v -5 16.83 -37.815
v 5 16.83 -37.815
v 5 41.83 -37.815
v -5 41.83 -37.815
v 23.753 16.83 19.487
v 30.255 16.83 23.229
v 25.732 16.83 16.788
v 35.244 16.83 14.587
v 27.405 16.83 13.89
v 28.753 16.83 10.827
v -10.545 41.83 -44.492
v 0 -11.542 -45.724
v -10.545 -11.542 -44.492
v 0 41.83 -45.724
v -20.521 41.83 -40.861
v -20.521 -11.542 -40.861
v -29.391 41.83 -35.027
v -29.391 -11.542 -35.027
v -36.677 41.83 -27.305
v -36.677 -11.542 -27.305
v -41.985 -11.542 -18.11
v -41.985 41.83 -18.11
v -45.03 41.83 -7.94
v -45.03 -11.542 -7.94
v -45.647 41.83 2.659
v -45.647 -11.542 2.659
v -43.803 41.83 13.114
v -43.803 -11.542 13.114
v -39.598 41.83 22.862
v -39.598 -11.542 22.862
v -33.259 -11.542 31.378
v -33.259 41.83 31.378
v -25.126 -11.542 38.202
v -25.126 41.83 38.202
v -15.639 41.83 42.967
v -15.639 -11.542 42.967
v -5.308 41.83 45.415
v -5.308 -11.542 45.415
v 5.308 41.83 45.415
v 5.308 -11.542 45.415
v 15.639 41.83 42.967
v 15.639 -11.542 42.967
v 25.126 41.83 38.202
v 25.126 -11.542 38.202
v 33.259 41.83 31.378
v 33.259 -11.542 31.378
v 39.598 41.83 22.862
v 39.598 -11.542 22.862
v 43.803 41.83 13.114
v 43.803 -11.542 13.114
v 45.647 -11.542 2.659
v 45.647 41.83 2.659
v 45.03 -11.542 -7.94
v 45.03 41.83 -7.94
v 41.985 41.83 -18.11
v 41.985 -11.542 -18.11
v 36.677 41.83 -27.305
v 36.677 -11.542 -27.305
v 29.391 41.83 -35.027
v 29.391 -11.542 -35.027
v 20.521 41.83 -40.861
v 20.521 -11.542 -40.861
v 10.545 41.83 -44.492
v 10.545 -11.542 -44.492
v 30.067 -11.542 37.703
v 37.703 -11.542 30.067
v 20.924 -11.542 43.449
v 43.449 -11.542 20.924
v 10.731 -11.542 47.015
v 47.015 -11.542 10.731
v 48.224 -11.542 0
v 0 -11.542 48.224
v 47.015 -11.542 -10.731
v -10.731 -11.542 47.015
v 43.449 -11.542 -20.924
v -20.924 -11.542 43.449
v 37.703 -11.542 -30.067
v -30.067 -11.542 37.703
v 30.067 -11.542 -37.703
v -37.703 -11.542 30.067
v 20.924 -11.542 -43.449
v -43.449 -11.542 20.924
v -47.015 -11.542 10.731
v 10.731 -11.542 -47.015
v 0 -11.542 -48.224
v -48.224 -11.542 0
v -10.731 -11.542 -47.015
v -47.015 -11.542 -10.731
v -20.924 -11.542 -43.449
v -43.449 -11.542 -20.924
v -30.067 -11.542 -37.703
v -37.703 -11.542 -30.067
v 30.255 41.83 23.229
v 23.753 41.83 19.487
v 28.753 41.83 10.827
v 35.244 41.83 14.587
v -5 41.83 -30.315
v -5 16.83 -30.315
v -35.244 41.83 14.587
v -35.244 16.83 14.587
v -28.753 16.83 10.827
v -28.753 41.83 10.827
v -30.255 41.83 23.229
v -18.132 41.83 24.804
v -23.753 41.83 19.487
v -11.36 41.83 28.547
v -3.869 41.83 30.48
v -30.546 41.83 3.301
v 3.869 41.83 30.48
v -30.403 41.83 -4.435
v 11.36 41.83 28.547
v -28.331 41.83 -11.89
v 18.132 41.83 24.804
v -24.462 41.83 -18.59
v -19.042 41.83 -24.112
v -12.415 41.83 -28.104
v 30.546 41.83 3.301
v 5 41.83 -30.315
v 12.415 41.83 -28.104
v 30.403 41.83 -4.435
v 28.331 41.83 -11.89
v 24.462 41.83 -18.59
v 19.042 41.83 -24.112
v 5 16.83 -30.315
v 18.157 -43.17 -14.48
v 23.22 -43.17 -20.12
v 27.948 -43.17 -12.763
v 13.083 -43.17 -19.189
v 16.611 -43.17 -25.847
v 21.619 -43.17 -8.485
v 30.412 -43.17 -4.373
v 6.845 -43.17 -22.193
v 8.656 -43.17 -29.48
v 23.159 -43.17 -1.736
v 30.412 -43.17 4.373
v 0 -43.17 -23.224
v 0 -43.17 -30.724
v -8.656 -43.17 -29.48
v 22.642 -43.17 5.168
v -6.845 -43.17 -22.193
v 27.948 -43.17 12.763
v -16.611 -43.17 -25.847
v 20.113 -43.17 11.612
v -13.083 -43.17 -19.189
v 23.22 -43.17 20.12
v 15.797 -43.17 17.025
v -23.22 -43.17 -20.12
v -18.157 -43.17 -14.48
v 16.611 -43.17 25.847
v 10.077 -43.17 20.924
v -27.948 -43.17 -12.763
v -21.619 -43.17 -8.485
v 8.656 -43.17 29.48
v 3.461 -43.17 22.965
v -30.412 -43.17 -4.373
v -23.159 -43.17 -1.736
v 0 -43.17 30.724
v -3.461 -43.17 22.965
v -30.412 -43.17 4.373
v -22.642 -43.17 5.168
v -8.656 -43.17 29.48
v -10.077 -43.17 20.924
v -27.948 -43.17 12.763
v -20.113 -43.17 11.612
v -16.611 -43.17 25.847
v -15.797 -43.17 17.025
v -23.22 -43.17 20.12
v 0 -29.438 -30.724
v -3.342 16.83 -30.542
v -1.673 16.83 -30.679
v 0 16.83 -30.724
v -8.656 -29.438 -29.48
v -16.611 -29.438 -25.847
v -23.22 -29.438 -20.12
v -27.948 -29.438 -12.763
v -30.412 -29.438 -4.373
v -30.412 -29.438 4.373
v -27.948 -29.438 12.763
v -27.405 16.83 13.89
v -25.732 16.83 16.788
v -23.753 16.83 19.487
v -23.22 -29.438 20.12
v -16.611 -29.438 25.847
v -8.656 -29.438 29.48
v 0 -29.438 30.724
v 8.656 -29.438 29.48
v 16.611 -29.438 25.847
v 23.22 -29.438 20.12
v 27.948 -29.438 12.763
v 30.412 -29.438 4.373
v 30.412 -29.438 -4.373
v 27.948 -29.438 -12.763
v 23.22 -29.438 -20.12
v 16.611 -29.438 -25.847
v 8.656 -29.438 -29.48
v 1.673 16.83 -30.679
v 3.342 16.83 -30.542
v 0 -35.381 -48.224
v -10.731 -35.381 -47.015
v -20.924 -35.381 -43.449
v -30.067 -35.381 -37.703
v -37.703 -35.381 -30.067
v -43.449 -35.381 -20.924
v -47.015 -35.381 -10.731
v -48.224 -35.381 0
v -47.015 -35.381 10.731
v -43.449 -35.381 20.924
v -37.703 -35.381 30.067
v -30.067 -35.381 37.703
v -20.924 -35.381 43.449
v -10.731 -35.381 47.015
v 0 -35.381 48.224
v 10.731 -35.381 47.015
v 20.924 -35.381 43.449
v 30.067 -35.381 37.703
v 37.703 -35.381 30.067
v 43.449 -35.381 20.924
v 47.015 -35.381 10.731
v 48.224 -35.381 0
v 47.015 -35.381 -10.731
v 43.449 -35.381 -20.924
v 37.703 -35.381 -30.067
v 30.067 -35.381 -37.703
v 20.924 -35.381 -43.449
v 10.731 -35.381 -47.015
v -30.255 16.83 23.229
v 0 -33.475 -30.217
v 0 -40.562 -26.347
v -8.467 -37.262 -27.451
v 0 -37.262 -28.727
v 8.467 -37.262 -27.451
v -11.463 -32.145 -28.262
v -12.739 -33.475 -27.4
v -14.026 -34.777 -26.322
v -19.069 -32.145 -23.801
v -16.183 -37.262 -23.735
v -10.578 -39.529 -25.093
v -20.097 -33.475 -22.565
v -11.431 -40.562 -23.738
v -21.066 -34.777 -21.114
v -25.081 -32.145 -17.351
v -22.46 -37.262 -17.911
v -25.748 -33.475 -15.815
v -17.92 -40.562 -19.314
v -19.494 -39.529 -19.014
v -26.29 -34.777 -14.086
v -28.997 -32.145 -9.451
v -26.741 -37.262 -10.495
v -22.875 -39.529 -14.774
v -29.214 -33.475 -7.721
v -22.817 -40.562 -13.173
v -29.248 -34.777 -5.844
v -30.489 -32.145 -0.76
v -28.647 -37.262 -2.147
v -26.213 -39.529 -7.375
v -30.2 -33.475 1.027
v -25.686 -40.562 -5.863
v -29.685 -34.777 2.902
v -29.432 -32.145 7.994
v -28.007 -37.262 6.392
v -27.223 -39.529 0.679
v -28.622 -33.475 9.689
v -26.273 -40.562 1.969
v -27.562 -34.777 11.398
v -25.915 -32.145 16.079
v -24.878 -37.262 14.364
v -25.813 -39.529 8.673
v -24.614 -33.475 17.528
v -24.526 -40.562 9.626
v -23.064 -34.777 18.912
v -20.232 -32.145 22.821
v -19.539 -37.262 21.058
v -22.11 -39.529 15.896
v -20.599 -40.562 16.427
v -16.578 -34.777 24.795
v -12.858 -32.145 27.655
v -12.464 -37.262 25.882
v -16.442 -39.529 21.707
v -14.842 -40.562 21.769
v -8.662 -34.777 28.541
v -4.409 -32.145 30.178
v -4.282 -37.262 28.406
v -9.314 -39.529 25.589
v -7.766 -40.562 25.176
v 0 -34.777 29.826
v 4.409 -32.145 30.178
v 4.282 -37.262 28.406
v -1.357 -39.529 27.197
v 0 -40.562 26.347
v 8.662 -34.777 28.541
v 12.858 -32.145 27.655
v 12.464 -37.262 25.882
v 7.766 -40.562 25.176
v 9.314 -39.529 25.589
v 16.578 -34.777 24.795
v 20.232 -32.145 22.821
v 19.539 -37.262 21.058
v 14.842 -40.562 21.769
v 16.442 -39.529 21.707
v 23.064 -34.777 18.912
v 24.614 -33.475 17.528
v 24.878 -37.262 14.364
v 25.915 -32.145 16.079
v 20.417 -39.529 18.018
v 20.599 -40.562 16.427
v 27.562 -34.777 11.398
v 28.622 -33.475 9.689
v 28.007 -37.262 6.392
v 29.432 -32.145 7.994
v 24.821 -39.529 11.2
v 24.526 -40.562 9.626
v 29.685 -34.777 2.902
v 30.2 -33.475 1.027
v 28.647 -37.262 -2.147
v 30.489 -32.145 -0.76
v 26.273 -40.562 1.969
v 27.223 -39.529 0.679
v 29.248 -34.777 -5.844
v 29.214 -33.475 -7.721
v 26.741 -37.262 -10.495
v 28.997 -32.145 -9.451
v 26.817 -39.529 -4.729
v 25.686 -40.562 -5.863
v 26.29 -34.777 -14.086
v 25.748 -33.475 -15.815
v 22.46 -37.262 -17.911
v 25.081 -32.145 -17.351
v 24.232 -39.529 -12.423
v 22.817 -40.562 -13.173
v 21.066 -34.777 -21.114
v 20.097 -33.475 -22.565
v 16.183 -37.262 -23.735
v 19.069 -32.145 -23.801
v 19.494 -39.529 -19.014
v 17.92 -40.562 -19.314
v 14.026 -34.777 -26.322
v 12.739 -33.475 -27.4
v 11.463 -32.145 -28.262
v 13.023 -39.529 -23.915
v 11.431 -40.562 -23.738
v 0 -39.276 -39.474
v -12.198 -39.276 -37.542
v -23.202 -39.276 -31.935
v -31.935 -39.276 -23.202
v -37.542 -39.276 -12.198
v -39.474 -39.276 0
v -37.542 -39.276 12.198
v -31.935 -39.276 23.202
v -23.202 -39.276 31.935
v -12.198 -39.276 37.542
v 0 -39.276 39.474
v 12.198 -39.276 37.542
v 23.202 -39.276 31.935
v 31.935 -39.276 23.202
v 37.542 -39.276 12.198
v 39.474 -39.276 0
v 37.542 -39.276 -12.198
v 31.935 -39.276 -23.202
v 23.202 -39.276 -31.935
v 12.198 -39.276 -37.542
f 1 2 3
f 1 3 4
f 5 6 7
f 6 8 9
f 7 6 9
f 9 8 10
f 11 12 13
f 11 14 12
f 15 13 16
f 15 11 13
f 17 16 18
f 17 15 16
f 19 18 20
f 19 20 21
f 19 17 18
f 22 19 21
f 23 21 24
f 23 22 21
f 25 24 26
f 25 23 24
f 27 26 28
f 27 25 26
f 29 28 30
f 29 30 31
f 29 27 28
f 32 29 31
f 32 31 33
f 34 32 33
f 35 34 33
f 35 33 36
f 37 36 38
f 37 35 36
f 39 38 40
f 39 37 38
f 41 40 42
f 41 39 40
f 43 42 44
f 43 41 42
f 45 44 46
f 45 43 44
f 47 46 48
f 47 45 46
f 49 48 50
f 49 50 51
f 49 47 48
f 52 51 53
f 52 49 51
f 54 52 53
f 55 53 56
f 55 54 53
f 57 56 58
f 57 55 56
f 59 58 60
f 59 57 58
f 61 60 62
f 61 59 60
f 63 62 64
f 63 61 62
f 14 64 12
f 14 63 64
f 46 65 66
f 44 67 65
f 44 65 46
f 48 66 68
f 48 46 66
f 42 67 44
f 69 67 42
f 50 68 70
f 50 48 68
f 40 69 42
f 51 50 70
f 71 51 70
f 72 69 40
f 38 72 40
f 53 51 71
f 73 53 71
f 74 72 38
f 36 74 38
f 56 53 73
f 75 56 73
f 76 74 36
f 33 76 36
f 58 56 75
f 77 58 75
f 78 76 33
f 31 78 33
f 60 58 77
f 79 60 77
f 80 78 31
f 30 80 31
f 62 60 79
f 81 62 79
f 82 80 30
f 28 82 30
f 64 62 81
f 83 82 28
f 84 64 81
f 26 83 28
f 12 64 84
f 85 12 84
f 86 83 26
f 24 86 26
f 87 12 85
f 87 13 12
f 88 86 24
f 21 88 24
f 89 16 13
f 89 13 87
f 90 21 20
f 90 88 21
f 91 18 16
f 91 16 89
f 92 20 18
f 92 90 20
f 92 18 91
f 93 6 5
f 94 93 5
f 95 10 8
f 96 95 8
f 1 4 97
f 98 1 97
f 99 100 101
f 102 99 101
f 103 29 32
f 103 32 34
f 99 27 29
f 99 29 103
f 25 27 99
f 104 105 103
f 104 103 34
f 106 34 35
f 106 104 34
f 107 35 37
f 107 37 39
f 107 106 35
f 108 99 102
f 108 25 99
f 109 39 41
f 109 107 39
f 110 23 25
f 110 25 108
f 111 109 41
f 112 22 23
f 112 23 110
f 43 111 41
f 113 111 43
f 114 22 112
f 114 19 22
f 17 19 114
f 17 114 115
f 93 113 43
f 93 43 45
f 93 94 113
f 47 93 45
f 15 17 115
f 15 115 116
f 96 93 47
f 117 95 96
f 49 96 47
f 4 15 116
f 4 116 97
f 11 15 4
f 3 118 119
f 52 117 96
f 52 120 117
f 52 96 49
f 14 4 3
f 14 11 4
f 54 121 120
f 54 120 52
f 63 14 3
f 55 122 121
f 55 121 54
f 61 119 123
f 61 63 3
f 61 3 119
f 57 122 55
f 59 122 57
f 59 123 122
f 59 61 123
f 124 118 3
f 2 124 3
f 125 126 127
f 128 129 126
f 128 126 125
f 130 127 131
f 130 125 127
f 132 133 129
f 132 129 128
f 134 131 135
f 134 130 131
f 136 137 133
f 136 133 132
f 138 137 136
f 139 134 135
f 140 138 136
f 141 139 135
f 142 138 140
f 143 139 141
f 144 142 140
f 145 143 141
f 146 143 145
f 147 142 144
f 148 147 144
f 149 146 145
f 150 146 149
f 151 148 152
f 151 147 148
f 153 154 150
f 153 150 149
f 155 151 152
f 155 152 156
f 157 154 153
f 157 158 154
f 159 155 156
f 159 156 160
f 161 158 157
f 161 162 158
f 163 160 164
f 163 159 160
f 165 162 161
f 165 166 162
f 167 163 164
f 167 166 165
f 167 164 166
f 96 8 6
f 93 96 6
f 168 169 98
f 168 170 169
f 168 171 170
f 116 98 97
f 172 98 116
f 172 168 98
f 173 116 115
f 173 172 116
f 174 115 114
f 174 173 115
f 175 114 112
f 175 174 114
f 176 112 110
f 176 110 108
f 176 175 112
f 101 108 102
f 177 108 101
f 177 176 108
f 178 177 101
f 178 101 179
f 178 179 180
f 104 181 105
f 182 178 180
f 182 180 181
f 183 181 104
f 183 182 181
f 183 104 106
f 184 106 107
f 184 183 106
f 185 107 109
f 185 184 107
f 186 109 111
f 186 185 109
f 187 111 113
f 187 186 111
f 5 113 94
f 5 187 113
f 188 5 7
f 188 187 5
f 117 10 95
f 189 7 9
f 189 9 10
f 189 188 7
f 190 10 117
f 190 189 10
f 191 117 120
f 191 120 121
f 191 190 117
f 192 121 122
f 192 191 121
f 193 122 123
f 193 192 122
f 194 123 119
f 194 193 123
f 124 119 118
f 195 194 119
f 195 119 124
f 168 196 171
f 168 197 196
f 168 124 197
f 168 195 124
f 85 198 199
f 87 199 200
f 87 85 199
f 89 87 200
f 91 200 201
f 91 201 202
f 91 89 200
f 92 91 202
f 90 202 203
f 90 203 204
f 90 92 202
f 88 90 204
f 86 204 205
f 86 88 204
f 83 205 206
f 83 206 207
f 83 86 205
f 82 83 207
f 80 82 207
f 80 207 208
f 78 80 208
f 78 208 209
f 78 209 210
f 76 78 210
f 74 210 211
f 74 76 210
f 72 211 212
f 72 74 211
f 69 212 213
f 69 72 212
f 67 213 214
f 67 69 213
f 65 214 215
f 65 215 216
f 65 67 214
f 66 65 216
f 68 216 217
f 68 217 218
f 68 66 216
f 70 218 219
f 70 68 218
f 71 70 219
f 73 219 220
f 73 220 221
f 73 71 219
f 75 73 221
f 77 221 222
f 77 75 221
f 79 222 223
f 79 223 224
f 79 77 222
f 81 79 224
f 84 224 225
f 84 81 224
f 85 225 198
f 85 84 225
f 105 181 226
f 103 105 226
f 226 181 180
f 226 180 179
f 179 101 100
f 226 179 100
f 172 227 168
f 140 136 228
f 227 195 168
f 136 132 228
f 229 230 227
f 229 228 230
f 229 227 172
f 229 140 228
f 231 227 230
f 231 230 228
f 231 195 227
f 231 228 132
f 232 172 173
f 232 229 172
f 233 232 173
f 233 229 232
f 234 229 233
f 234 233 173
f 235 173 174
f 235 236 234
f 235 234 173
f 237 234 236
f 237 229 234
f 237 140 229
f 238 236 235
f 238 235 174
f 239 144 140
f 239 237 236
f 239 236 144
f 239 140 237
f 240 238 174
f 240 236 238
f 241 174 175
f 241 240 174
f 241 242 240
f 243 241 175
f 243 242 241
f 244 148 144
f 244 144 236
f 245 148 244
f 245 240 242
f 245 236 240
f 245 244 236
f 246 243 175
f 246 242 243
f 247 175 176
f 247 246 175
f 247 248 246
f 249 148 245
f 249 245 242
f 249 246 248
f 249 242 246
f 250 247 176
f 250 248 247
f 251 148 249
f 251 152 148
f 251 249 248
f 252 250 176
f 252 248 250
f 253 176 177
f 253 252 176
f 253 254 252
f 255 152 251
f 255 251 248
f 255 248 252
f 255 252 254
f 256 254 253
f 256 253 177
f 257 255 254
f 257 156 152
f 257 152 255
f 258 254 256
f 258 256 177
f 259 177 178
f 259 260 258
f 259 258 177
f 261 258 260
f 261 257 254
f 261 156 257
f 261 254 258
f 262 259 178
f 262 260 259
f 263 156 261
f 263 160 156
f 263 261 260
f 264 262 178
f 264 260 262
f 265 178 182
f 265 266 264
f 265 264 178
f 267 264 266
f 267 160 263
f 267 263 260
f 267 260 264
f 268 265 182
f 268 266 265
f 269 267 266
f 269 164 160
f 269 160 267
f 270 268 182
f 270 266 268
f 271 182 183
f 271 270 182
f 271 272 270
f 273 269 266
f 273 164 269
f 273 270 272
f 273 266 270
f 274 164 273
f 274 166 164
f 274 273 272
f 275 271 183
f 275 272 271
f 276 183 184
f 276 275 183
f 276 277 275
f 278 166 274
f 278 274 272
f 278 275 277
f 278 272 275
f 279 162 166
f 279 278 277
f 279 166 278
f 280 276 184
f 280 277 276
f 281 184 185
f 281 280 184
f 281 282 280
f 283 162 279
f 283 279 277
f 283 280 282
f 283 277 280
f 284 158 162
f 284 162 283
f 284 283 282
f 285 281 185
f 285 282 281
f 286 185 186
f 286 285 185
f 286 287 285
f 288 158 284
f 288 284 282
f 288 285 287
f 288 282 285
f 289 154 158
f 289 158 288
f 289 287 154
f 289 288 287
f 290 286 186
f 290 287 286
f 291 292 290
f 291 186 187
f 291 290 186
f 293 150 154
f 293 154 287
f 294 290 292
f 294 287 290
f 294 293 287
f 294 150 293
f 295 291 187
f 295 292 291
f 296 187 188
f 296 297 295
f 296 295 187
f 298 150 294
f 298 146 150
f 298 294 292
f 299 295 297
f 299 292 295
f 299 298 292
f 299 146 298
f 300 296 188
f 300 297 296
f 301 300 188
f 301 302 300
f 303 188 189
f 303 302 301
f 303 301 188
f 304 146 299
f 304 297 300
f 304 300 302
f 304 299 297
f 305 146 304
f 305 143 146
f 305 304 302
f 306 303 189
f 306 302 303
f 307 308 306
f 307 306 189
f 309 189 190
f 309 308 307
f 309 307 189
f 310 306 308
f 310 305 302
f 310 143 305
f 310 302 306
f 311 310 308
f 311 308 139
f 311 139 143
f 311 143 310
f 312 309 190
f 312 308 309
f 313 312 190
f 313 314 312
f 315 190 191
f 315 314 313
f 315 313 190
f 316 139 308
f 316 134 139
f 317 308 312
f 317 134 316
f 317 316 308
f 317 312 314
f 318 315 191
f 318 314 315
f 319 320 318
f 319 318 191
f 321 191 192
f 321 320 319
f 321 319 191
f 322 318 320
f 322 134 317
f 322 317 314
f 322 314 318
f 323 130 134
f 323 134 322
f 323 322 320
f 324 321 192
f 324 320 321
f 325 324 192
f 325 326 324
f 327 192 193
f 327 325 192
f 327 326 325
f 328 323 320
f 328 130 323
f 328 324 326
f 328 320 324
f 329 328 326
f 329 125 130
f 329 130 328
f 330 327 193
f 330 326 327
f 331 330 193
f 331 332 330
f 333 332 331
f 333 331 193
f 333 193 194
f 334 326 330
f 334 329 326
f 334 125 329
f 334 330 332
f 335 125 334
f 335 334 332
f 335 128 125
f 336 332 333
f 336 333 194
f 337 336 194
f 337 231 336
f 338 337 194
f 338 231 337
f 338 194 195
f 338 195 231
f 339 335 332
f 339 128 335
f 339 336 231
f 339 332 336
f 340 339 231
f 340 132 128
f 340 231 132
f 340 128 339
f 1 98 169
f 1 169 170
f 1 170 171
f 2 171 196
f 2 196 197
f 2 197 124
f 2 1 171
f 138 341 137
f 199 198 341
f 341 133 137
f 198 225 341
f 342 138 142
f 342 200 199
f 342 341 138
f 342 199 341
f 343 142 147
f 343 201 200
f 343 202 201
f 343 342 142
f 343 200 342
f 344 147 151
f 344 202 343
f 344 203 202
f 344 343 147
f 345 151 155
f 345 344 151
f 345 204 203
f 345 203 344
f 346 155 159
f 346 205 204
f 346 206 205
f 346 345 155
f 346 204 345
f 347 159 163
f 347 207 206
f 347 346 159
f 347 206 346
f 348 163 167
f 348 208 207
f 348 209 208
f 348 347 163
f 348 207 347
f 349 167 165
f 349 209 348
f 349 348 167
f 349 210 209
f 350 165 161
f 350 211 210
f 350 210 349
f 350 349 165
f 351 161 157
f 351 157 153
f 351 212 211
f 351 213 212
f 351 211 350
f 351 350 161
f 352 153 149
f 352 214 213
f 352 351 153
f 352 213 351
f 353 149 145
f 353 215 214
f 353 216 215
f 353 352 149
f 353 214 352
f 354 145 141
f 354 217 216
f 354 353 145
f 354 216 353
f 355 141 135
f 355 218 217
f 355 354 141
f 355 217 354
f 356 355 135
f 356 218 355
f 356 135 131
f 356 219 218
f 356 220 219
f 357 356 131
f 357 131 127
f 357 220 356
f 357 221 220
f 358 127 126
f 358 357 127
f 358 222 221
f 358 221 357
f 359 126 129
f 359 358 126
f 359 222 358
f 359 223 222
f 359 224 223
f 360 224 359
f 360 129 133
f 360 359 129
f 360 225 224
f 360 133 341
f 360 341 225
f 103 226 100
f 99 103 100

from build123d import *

# Parameters (mm, degrees)
SKETCH3_R           = 38.22429912
SKETCH3_R_2         = 30.72429912
BOSS_EXTRUDE1_DEPTH = 25
CUT_EXTRUDE1_START  = -25
CUT_EXTRUDE1_DEPTH  = 25


with BuildPart() as part:
    # Sketch1 → Revolve1 (revolve)
    with BuildSketch(Plane.XY, mode=Mode.PRIVATE) as revolve1_sk:
        with BuildLine():
            Line((-23.22429912, -43.170194275), (-30.72429912, -43.170194275))
            Line((-30.72429912, -43.170194275), (-48.22429912, -35.38123915))
            Line((-48.22429912, -35.38123915), (-48.22429912, -11.542441336))
            Line((-48.22429912, -11.542441336), (-45.72429912, -11.542441336))
            Line((-45.72429912, -11.542441336), (-45.72429912, 41.829805725))
            Line((-45.72429912, 41.829805725), (-38.22429912, 41.829805725))
            Line((-38.22429912, 41.829805725), (-38.22429912, 16.829805725))
            Line((-38.22429912, 16.829805725), (-30.72429912, 16.829805725))
            Line((-30.72429912, 16.829805725), (-30.72429912, -29.438323417))
            ThreePointArc((-30.72429912, -29.438323417), (-28.727100264, -37.261594428), (-23.22429912, -43.170194275))
        make_face()
    revolve(revolve1_sk.sketch.rotate(Axis((0, 0, 0), (0, 1, 0)), 270), axis=Axis((0, 0, 0), (0, 1, 0)))

    # Sketch3 → Boss-Extrude1 (add)
    with BuildSketch(Plane(origin=(0, 16.829805725, 0), x_dir=(1, 0, 0), z_dir=(0, 1, 0))):
        Circle(SKETCH3_R)
        with Locations(Location((0, 0, 0), (0, 0, 90))):
            Circle(SKETCH3_R_2, mode=Mode.SUBTRACT)
    extrude(amount=BOSS_EXTRUDE1_DEPTH)

    # Sketch4 → Cut-Extrude1 (cut)
    with BuildSketch(Plane(origin=(0, 41.829805725, 0), x_dir=(1, 0, 0), z_dir=(0, 1, 0)).offset(CUT_EXTRUDE1_START)):
        with BuildLine():
            Line((-5, 37.814725075), (-5, 30.314725075))
            ThreePointArc((-5, 30.314725075), (0, 30.72429912), (5, 30.314725075))
            Line((5, 30.314725075), (5, 37.814725075))
            Line((5, 37.814725075), (-5, 37.814725075))
        make_face()
        with BuildLine():
            Line((30.254977775, -23.229071276), (23.753322024, -19.487489557))
            ThreePointArc((23.753322024, -19.487489557), (26.608023551, -15.36214956), (28.753322024, -10.827235519))
            Line((28.753322024, -10.827235519), (35.244454719, -14.587043706))
            Line((35.244454719, -14.587043706), (30.254977775, -23.229071276))
        make_face()
        with BuildLine():
            Line((-35.244454719, -14.587043706), (-28.753322024, -10.827235519))
            ThreePointArc((-28.753322024, -10.827235519), (-26.608023551, -15.36214956), (-23.753322024, -19.487489557))
            Line((-23.753322024, -19.487489557), (-30.254977775, -23.229071276))
            Line((-30.254977775, -23.229071276), (-35.244454719, -14.587043706))
        make_face()
    extrude(amount=CUT_EXTRUDE1_DEPTH, mode=Mode.SUBTRACT)


solid = part.part
